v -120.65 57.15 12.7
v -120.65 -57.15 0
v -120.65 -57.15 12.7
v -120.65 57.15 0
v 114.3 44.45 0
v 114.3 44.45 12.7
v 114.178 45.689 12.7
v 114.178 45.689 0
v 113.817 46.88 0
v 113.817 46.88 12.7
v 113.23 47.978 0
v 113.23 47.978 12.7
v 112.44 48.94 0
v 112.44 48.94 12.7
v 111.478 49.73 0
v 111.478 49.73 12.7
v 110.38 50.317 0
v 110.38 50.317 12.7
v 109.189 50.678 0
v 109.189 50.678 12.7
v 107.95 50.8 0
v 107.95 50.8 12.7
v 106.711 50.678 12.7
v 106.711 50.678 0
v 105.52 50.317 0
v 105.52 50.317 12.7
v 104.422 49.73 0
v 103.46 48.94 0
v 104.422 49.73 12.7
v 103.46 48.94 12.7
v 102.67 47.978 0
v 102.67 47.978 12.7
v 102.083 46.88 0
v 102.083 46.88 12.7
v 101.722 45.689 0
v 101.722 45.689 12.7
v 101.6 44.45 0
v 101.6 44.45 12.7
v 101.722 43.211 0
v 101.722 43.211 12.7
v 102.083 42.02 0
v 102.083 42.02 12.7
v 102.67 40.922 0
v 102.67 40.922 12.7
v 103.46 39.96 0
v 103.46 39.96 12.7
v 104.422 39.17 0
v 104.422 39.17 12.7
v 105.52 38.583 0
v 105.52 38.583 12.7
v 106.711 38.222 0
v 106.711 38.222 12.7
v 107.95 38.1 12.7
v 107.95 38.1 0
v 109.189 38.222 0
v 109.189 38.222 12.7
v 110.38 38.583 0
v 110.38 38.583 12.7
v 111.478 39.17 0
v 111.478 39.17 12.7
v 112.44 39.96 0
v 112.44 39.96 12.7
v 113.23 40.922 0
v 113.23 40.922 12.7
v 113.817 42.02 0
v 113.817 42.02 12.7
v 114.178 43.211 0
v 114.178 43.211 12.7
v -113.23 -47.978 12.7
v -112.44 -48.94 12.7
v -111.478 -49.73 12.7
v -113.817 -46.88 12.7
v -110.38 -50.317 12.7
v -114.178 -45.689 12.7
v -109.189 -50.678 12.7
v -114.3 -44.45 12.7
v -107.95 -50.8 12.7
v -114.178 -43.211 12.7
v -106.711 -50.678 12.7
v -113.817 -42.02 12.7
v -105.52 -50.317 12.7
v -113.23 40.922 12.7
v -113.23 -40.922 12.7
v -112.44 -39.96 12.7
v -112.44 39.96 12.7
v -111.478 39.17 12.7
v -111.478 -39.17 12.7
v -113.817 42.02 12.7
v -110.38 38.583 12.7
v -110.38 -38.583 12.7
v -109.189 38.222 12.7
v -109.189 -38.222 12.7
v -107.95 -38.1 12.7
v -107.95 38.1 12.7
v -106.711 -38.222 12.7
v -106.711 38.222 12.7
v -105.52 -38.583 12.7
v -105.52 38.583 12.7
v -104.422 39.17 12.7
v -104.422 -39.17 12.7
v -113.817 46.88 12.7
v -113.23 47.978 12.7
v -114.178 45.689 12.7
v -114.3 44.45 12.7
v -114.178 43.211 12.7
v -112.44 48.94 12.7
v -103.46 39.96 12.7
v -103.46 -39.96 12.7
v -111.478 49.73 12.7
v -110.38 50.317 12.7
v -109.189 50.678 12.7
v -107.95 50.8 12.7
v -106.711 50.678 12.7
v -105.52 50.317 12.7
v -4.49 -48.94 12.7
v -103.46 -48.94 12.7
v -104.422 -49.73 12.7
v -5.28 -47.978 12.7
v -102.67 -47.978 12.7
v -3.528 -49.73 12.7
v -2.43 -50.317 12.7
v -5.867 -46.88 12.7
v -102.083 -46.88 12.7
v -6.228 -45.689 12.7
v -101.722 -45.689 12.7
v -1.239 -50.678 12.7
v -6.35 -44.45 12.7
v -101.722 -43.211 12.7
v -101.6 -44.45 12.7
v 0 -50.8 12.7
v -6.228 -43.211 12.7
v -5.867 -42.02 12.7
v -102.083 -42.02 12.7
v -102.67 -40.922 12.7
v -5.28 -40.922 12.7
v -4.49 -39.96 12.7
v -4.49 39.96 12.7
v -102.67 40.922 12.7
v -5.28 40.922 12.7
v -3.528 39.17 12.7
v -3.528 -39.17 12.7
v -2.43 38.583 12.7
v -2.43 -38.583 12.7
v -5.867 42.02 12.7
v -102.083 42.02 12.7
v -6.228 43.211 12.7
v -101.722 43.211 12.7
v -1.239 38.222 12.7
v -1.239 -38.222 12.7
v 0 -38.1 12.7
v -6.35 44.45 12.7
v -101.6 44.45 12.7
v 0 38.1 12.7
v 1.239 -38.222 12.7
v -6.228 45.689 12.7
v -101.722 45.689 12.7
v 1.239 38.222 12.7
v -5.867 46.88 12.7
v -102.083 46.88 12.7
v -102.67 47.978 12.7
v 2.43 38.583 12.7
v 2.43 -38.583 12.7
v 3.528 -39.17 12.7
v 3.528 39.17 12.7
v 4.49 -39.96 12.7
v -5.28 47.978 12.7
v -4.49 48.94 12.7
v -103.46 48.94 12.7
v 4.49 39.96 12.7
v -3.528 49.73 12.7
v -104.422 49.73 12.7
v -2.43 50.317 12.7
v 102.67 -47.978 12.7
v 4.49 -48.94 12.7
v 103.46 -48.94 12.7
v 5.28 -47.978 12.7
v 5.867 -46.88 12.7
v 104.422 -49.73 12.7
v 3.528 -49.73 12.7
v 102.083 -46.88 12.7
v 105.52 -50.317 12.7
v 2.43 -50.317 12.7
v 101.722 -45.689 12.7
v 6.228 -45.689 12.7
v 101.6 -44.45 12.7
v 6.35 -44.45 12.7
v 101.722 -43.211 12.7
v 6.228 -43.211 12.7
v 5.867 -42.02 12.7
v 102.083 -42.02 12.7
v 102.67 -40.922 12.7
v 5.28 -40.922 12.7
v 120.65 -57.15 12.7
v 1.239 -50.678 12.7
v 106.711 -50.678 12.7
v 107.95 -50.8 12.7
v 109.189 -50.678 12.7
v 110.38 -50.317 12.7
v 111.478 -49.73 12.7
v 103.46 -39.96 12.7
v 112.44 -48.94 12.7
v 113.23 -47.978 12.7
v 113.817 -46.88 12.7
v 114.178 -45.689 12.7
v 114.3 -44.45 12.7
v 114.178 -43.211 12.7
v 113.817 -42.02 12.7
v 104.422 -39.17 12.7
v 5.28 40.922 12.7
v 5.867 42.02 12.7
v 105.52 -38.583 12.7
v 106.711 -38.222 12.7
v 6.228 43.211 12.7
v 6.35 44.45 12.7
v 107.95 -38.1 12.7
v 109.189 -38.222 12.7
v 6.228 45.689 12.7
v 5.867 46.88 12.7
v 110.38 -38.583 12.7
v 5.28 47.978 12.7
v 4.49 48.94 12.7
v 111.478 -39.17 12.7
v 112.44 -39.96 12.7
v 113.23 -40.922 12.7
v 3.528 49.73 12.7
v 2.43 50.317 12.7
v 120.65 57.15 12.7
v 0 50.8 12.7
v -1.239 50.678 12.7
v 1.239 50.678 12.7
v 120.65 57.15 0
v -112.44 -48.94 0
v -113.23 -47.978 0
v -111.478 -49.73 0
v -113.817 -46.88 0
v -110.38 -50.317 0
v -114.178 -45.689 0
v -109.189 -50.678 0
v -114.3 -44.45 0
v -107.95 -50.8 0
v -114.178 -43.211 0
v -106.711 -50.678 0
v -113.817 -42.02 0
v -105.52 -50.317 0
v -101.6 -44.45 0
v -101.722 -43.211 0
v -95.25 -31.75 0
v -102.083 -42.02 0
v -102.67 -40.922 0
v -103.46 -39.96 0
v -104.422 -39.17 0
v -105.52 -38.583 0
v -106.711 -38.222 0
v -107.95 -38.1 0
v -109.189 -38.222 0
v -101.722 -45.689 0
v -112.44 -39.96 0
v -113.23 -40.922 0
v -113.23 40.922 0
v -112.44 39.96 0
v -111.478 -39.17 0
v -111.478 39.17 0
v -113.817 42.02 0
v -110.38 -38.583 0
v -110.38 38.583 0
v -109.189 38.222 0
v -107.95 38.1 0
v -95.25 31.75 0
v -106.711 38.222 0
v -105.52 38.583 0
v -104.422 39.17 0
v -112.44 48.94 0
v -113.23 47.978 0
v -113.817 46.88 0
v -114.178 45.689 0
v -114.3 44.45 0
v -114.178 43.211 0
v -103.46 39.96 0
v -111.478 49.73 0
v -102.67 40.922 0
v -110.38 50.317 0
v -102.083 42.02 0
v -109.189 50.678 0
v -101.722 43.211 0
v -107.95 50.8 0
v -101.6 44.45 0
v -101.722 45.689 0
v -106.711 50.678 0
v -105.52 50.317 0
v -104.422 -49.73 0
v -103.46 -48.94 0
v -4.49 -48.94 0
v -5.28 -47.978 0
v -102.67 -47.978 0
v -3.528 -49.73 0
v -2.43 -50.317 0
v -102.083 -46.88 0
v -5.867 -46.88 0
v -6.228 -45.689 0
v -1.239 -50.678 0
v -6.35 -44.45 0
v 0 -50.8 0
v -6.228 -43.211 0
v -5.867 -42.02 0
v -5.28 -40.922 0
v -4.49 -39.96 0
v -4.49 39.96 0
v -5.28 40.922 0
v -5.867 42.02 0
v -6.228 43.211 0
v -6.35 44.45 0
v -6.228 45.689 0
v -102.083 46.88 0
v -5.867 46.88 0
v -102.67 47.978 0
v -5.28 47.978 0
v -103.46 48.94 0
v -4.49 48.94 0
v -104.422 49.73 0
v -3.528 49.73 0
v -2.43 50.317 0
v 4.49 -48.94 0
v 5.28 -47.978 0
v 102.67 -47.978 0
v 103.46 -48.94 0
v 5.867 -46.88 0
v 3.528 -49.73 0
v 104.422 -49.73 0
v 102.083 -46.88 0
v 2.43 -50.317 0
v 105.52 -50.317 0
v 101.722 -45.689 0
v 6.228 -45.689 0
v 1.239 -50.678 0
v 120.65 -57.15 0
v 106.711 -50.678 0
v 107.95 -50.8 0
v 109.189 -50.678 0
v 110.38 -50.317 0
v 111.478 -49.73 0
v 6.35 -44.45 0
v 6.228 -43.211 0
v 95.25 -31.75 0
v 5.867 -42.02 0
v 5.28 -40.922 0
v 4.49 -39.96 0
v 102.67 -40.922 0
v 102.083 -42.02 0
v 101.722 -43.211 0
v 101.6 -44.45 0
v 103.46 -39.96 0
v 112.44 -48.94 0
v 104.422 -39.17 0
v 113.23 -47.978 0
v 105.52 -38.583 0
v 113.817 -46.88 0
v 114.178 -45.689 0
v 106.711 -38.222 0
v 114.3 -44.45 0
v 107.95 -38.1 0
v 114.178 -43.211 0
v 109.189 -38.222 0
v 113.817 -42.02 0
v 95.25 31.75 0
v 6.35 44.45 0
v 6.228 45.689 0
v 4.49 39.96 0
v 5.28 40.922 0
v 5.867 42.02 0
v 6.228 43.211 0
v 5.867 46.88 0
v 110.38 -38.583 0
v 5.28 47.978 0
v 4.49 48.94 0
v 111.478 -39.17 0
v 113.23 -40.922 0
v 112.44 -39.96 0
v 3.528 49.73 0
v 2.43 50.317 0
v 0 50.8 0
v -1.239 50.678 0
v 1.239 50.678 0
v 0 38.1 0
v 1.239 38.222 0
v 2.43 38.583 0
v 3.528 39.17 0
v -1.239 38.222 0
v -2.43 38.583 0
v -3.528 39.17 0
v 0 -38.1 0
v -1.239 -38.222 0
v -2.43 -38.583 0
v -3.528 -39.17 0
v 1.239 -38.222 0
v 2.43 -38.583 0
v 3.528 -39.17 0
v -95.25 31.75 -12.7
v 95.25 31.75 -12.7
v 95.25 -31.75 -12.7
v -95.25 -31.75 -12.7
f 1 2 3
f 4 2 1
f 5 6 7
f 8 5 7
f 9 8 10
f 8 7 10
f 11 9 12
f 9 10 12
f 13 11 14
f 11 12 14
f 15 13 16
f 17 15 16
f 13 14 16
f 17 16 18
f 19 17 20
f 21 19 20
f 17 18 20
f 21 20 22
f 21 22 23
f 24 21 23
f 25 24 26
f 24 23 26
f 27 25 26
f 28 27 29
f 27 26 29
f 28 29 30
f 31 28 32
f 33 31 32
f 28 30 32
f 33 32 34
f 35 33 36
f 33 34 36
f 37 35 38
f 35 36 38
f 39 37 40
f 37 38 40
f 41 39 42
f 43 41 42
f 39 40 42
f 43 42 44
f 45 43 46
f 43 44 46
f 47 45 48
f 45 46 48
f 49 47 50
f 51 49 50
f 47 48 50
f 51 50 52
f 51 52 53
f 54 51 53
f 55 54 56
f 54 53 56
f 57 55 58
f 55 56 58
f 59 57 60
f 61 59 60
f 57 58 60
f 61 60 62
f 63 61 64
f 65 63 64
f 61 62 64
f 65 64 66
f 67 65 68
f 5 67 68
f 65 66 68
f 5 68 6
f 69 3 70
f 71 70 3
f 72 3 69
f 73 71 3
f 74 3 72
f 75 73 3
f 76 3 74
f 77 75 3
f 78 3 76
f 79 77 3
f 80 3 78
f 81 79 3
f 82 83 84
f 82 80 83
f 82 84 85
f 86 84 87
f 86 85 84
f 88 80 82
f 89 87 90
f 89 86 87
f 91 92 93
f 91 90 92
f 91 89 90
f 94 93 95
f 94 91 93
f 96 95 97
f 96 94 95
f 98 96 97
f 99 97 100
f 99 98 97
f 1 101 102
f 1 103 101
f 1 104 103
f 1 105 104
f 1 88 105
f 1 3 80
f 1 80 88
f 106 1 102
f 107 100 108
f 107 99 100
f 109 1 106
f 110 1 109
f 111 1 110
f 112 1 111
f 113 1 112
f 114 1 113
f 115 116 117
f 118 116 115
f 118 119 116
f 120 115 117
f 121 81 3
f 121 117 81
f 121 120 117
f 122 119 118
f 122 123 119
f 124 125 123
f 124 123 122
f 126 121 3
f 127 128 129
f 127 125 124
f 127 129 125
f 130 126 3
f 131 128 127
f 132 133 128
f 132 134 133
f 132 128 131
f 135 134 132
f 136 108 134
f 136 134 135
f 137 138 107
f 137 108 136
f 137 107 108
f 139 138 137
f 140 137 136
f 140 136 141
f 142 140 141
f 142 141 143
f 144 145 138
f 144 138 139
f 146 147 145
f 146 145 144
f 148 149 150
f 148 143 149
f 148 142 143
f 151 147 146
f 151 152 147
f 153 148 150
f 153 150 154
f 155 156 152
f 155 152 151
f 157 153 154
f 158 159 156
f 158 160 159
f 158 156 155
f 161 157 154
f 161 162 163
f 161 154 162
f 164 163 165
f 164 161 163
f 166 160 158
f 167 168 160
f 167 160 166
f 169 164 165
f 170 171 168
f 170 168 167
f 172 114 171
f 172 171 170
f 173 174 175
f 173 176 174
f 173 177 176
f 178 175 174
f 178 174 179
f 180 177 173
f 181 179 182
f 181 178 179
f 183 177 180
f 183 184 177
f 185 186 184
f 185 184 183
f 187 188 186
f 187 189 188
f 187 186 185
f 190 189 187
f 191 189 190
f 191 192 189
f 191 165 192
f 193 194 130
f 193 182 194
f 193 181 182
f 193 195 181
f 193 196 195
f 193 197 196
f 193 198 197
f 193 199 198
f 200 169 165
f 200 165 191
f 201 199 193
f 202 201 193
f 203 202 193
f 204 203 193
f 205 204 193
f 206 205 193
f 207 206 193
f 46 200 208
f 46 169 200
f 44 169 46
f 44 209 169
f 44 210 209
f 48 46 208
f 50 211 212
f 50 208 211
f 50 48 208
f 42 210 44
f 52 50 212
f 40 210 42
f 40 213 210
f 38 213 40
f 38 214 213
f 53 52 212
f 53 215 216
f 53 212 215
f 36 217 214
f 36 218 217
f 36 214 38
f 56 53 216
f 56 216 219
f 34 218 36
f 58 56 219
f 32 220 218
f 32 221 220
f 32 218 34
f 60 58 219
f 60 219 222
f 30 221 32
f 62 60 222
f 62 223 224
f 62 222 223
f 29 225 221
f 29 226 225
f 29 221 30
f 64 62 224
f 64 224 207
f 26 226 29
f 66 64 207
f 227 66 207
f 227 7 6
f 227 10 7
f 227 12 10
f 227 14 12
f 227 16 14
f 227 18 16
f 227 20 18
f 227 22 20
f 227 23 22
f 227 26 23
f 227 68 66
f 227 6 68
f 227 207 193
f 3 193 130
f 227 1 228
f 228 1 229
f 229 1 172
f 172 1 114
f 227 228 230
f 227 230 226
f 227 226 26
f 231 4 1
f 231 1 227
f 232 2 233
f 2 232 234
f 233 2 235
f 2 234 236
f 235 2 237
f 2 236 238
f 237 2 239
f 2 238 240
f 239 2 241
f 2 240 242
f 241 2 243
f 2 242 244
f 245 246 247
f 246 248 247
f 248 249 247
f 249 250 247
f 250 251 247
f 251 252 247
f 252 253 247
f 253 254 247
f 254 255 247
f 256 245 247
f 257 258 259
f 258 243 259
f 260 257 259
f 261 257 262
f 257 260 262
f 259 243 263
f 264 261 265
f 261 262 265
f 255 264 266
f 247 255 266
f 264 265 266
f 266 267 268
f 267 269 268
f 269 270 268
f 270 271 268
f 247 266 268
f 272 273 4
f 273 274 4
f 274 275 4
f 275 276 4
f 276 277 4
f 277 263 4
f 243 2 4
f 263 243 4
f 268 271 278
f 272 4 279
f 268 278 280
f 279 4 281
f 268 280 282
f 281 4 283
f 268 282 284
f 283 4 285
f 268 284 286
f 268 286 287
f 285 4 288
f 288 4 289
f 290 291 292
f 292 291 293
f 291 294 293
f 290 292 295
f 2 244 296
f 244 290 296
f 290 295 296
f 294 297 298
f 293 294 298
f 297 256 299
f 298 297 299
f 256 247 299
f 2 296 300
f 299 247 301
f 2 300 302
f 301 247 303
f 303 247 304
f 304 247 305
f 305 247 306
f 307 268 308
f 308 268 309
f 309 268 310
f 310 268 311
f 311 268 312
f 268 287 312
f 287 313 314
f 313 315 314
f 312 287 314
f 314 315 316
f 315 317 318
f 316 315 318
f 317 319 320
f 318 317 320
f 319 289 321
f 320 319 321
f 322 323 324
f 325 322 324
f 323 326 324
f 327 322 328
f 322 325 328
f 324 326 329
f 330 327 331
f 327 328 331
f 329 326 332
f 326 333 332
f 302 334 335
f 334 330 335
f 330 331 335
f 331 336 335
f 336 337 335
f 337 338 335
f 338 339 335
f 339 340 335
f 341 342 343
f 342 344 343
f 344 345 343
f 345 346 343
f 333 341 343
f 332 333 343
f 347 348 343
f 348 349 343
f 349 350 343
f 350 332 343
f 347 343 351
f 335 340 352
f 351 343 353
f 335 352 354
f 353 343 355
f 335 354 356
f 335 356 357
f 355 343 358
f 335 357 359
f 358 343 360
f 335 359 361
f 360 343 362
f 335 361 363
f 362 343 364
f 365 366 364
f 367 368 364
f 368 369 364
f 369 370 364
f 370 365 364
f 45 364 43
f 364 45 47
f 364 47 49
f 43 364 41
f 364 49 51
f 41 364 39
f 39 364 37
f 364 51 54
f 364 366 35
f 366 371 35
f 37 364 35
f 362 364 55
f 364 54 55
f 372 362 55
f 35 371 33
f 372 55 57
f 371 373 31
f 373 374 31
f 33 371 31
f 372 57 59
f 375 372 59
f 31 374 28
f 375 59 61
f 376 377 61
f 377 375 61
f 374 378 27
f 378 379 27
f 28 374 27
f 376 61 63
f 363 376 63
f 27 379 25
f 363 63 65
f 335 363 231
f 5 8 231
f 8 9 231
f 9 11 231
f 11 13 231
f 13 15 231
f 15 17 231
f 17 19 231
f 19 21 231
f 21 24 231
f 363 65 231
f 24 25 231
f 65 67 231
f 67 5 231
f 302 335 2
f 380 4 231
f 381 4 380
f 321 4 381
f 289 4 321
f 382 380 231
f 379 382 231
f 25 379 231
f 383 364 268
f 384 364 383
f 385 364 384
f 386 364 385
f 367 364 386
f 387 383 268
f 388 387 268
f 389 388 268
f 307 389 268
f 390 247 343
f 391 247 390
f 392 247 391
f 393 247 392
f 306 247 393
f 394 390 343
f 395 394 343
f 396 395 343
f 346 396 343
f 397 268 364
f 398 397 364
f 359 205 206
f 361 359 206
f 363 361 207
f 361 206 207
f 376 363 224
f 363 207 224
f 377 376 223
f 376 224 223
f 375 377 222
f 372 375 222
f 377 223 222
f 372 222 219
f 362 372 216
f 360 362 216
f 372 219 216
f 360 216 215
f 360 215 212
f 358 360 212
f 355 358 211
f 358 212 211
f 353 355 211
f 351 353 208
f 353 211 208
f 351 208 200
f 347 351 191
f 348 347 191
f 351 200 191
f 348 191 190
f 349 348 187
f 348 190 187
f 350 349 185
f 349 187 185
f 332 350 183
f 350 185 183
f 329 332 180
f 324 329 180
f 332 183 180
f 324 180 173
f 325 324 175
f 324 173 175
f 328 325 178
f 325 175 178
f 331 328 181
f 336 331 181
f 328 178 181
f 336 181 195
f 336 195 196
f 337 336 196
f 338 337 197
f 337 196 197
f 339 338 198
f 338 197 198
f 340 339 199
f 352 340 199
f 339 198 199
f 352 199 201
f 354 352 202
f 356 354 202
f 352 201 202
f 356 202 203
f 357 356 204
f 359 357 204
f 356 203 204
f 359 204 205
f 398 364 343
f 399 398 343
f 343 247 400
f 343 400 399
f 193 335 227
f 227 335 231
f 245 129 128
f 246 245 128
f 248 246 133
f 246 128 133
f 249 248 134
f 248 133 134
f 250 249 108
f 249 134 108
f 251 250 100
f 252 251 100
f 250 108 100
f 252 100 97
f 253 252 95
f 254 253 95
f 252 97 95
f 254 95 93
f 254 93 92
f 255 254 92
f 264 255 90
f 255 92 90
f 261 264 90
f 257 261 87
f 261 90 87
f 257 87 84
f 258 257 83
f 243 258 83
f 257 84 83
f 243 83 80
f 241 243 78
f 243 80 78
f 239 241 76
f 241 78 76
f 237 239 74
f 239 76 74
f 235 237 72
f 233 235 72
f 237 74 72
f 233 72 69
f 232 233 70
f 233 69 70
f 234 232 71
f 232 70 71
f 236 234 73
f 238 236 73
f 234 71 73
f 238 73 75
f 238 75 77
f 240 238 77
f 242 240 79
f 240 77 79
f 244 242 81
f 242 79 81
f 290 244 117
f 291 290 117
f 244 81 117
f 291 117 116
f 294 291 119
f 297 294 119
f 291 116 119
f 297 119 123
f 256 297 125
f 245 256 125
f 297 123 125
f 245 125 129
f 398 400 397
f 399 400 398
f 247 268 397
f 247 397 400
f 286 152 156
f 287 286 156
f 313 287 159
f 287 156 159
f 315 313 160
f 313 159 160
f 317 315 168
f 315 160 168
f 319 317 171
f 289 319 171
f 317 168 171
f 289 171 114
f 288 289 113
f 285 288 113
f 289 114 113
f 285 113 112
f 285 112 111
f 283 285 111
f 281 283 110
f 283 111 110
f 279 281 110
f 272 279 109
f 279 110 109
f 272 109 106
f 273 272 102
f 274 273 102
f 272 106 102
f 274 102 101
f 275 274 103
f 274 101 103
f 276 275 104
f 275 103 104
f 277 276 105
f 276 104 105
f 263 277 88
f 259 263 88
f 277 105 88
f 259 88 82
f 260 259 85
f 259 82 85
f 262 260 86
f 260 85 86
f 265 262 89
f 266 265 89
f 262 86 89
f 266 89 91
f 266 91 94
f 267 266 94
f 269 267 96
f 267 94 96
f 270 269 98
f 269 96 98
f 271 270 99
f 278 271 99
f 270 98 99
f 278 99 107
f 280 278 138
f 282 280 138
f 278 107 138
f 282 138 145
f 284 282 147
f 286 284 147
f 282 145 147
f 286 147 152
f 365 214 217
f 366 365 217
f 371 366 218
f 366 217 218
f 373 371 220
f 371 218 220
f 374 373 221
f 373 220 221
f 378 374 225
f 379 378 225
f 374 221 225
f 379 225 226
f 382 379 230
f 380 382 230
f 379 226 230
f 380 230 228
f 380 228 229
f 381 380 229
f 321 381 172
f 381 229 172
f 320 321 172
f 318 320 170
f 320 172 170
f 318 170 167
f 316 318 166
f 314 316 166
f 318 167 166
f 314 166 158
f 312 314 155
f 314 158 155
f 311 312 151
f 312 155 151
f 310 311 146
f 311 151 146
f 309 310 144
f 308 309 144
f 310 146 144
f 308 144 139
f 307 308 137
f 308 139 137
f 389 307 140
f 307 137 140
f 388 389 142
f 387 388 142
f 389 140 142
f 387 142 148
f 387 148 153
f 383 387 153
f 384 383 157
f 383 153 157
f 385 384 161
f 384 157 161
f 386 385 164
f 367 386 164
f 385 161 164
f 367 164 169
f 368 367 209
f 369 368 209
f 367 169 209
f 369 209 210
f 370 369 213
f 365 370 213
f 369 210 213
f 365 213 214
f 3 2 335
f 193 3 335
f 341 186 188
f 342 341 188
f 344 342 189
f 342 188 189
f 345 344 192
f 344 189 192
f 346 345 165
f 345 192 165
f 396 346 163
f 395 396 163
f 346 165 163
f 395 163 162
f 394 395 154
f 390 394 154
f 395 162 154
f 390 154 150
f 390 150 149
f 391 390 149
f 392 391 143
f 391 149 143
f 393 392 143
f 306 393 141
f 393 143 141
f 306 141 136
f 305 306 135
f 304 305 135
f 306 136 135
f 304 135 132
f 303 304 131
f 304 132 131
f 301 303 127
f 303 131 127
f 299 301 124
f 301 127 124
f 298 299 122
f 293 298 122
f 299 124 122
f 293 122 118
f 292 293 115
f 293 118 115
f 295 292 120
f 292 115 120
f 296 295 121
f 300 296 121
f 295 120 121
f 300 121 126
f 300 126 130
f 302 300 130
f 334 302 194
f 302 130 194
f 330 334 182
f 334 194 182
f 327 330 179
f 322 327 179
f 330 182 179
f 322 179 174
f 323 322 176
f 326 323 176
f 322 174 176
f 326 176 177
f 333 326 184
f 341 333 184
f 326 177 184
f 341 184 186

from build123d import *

# Parameters (mm, degrees)
F0_W     = 241.3
F0_H     = 114.3
F1_DEPTH = 12.7
F2_W     = 190.5
F2_H     = 63.5
F3_DEPTH = 12.7
F4_R     = 6.35
F5_DEPTH = 12.7


# Not quite as in the source:
# - a feature names something its author has since deleted; it is built from what else it names


with BuildPart() as f1:
    # F0 (on Top) → F1 (new body)
    with BuildSketch(Plane.XY):
        Rectangle(F0_W, F0_H)
    extrude(amount=F1_DEPTH)

    # F2 (on face) → F3 (join)
    with BuildSketch(Plane(origin=(0, 0, 0), x_dir=(1, 0, 0), z_dir=(0, 0, -1))):
        Rectangle(F2_W, F2_H)
    extrude(amount=F3_DEPTH)

    # F4 (on face) → F5 (cut)
    with BuildSketch(Plane.XY.offset(12.7)):
        with Locations((-107.95, 44.45)):
            Circle(F4_R)
        with Locations((-107.95, -44.45)):
            Circle(F4_R)
        with Locations((107.95, -44.45)):
            Circle(F4_R)
        with Locations((107.95, 44.45)):
            Circle(F4_R)
        with Locations((0, 44.45)):
            Circle(F4_R)
        with Locations((0, -44.45)):
            Circle(F4_R)
    extrude(amount=-F5_DEPTH, mode=Mode.SUBTRACT)


solid = f1.part
